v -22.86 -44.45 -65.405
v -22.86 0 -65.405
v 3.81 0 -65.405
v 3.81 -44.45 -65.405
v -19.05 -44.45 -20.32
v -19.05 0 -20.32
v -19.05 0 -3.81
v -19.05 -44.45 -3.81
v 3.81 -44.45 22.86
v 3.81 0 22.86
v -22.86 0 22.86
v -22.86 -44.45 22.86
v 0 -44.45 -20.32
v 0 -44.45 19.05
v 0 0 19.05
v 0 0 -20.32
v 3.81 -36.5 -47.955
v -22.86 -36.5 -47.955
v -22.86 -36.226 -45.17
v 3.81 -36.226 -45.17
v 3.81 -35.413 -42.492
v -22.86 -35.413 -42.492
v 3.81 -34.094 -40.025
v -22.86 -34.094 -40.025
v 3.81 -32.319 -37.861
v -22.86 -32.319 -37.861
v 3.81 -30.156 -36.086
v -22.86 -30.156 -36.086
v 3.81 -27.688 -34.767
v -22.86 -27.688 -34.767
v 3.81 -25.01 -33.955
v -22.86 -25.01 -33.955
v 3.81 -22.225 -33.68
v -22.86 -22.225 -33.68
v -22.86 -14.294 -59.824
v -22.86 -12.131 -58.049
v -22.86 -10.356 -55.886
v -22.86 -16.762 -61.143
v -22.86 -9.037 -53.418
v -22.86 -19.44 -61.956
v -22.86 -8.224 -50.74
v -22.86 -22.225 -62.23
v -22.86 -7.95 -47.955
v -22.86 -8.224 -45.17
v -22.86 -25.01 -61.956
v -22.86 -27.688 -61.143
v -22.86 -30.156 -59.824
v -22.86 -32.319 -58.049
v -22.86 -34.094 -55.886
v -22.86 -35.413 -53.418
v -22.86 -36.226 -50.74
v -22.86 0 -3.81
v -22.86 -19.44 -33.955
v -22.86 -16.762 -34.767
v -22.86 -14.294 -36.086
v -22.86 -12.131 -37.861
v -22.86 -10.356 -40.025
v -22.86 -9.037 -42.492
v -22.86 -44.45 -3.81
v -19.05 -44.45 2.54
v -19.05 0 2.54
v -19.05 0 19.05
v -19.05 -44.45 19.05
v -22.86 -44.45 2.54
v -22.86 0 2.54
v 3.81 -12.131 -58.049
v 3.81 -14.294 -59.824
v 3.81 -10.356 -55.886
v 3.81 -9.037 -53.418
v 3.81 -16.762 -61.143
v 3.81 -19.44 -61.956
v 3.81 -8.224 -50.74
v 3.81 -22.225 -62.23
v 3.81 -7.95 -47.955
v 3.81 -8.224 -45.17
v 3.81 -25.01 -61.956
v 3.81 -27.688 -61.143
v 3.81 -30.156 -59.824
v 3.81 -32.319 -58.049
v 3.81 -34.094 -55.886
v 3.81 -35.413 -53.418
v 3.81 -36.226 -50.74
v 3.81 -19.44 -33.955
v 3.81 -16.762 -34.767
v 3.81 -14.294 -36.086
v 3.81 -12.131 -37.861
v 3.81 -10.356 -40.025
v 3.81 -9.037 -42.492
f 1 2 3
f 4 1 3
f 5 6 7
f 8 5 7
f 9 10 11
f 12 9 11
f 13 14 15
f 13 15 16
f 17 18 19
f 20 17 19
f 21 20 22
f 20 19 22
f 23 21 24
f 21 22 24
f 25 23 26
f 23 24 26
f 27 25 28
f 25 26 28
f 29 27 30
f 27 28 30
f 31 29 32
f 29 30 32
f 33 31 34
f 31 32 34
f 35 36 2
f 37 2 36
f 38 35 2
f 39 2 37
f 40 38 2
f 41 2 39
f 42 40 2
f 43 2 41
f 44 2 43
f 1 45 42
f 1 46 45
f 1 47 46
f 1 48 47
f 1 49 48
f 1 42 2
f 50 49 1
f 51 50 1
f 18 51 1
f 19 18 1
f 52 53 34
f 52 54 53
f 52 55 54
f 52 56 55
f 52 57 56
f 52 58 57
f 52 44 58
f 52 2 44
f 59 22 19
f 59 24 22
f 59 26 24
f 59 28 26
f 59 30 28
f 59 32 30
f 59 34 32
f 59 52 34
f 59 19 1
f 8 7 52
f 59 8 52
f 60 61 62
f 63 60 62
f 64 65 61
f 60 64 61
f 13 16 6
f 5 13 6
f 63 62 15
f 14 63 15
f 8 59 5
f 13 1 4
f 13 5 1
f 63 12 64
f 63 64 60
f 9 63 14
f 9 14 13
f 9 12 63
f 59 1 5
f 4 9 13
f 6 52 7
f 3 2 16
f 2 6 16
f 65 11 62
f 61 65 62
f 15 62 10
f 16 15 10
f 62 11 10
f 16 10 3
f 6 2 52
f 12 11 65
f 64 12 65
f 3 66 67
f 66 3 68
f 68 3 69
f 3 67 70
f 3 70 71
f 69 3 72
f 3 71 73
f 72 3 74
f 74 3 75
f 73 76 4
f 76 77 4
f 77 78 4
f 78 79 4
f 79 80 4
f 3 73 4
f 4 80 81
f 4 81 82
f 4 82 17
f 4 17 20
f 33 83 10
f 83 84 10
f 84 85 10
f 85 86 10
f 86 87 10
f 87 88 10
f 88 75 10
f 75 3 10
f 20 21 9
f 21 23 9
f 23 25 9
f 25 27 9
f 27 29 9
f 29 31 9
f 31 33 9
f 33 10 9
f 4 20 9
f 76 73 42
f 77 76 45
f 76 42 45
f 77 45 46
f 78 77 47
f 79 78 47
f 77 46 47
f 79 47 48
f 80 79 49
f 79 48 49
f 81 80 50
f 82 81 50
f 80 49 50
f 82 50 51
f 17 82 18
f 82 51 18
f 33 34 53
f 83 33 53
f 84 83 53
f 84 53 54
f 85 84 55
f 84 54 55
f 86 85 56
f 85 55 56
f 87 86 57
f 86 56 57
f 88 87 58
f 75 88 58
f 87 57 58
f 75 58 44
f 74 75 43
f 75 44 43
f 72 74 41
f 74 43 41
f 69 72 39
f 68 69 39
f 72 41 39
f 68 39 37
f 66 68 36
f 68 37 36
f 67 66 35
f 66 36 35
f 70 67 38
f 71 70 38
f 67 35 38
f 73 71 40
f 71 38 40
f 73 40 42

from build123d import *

# Parameters (mm, degrees)
F1_DEPTH = 44.45
F2_DEPTH = 41.275
F4_DEPTH = 38.1


with BuildPart() as f1:
    # F0 (on Front) → F1 (new body)
    with BuildSketch(Plane.XZ):
        Polygon((0, 19.05), (0, 0), (0, -20.32), (-19.05, -20.32), (-19.05, -3.81), (-22.86, -3.81), (-22.86, -24.13), (3.81, -24.13), (3.81, 22.86), (-9.525, 22.86), (-22.86, 22.86), (-22.86, 2.54), (-19.05, 2.54), (-19.05, 19.05), align=None)
    extrude(amount=F1_DEPTH)

    # F2 (add): a face of the model
    f2_faces = [f1.faces().sort_by_distance(p)[0] for p in [
        (-9.525, -22.225, -24.13),
    ]]
    extrude(f2_faces, amount=F2_DEPTH)

    # F3 (on face) → F4 (cut)
    with BuildSketch(Plane(origin=(-22.86, 0, 0), x_dir=(0, -1, 0), z_dir=(-1, 0, 0))):
        with BuildLine():
            ThreePointArc((22.225, -33.6804), (7.9502, -47.9552), (22.225, -62.23))
            Line((22.225, -62.23), (22.225, -33.6804))
        make_face()
        with BuildLine():
            Line((22.225, -33.6804), (22.225, -62.23))
            ThreePointArc((22.225, -62.23), (32.3188078801, -58.0490078801), (36.4998, -47.9552))
            ThreePointArc((36.4998, -47.9552), (32.3188078801, -37.8613921199), (22.225, -33.6804))
        make_face()
    extrude(amount=-F4_DEPTH, mode=Mode.SUBTRACT)


solid = f1.part
